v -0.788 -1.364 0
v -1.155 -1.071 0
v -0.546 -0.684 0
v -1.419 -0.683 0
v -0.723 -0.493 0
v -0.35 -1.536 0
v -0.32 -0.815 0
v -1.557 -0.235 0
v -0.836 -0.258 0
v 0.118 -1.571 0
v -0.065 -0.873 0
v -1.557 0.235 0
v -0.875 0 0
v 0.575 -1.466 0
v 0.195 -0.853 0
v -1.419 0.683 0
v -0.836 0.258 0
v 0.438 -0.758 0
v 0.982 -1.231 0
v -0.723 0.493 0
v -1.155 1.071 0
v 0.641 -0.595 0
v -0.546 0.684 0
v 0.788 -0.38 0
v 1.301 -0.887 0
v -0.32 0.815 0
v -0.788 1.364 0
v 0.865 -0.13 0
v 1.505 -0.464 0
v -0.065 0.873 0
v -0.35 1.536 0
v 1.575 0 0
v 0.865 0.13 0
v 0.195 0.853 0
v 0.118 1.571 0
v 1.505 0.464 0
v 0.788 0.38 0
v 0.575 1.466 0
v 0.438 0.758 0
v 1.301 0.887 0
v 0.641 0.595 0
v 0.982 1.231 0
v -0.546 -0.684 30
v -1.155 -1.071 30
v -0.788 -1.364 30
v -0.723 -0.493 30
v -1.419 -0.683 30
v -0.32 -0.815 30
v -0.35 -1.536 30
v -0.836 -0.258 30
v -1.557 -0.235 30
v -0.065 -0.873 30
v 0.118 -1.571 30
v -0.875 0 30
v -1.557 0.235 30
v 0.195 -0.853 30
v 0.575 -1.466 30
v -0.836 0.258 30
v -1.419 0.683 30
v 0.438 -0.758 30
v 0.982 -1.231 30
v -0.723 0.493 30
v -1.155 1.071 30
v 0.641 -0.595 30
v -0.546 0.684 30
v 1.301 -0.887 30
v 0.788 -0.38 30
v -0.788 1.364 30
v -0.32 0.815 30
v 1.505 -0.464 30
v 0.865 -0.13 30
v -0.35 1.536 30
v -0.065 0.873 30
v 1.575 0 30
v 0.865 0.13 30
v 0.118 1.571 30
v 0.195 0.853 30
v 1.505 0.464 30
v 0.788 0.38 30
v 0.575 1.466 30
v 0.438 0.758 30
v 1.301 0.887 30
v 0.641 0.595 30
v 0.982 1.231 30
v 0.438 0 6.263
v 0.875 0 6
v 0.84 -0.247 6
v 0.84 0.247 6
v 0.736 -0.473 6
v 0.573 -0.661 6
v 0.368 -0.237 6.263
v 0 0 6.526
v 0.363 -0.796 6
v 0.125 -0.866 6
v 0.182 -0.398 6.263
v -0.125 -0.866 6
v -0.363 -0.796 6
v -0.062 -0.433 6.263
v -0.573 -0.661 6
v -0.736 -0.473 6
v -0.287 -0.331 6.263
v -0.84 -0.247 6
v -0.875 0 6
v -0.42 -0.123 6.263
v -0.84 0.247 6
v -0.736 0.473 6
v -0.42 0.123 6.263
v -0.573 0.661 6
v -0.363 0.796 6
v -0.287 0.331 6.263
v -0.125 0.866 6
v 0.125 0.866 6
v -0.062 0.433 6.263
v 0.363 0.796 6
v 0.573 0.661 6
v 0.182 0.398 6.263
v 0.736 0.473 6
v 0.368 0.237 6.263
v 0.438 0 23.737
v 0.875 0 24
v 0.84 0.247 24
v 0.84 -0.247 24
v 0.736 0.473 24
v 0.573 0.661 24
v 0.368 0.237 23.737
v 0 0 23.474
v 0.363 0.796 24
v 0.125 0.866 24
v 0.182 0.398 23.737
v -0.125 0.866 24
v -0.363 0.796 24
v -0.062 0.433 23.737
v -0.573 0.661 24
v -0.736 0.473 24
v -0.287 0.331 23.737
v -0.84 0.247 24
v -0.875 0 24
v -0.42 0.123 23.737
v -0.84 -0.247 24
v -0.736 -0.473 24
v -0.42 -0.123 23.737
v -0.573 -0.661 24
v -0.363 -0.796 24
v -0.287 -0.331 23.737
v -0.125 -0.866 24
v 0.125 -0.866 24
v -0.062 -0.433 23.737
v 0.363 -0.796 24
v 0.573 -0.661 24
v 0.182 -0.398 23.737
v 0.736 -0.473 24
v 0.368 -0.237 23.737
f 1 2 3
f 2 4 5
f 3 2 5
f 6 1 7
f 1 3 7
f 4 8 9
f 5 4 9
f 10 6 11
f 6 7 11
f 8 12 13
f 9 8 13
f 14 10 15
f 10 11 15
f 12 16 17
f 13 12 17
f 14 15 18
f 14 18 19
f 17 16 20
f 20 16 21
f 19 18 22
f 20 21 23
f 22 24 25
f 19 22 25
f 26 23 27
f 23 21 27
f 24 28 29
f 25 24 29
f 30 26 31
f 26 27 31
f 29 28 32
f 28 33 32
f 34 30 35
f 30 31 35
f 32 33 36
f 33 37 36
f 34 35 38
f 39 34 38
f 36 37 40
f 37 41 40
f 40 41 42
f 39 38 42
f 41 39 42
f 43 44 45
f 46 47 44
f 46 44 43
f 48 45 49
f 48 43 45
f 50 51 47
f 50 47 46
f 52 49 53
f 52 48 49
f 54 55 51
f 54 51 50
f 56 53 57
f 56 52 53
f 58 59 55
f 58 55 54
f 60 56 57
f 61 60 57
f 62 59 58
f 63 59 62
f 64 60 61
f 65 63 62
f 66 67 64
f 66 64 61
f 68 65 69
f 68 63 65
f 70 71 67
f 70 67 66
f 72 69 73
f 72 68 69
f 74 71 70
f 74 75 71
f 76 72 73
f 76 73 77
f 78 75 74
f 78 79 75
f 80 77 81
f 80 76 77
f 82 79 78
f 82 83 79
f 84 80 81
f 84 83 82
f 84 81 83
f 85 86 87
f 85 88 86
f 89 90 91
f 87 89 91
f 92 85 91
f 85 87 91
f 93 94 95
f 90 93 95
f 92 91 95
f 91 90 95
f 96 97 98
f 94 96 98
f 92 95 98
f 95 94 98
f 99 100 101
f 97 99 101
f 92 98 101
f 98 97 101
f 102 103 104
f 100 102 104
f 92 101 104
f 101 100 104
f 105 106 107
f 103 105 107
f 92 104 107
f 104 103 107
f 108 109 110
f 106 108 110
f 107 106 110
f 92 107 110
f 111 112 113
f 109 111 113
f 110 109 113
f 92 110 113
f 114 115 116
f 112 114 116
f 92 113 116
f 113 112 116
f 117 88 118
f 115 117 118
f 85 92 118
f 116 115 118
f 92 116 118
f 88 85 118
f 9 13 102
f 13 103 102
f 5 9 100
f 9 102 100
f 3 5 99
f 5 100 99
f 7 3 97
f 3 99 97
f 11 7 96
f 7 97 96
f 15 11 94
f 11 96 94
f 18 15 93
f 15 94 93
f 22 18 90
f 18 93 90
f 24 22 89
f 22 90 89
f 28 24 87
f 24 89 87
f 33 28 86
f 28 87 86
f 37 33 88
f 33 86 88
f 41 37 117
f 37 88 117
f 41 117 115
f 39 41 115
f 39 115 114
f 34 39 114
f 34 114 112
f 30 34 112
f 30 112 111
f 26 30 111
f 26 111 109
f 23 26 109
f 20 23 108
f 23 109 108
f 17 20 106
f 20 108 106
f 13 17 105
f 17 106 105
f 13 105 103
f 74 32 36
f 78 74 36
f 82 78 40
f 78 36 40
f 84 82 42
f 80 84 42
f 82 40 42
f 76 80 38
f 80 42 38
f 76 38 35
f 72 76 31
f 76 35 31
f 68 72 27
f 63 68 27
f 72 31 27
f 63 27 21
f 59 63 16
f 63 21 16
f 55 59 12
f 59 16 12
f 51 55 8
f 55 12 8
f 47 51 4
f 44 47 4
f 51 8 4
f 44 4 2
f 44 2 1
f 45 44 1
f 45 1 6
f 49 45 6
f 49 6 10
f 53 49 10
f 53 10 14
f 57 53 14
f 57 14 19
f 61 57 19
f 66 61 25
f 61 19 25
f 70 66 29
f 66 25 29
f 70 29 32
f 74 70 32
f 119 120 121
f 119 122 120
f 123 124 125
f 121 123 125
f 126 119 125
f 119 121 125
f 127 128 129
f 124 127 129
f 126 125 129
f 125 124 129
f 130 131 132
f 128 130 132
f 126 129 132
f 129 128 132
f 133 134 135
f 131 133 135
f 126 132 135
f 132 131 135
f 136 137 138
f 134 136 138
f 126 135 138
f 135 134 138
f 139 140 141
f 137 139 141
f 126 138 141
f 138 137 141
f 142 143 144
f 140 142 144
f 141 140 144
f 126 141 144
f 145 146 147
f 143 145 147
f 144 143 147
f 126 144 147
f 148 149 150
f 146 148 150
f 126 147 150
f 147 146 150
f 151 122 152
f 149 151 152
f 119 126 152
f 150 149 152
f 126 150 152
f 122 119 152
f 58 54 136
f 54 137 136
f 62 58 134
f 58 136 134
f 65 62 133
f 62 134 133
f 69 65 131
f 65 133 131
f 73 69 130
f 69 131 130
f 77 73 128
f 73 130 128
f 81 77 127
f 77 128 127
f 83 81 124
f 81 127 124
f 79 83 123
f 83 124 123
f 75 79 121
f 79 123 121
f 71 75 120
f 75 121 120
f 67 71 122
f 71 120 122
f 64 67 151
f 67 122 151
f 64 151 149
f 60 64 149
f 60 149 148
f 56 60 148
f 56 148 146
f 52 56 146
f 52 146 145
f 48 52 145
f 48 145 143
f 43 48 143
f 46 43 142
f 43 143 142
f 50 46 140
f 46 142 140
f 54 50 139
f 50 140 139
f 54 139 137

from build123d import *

# Parameters (mm, degrees)
F0_R     = 1.575
F1_DEPTH = 30
F3_D     = 1.75
F3_DEPTH = 6
F3_TIP   = 0.5257530416
F5_D     = 1.75
F5_DEPTH = 6
F5_TIP   = 0.5257530416


with BuildPart() as f1:
    # F0 (on Top) → F1 (new body)
    with BuildSketch(Plane.XY):
        Circle(F0_R)
    extrude(amount=F1_DEPTH)

    # F3
    with Locations(Plane.XY.offset(30)):
        with Locations((0, 0)):
            Hole(F3_D / 2, depth=F3_DEPTH)
            with Locations((0, 0, -(F3_DEPTH + F3_TIP / 2))):  # 118° drill point
                Cone(0, F3_D / 2, F3_TIP, mode=Mode.SUBTRACT)

    # F5
    with Locations(Plane(origin=(0, 0, 0), x_dir=(1, 0, 0), z_dir=(0, 0, -1))):
        with Locations((0, 0)):
            Hole(F5_D / 2, depth=F5_DEPTH)
            with Locations((0, 0, -(F5_DEPTH + F5_TIP / 2))):  # 118° drill point
                Cone(0, F5_D / 2, F5_TIP, mode=Mode.SUBTRACT)


solid = f1.part
